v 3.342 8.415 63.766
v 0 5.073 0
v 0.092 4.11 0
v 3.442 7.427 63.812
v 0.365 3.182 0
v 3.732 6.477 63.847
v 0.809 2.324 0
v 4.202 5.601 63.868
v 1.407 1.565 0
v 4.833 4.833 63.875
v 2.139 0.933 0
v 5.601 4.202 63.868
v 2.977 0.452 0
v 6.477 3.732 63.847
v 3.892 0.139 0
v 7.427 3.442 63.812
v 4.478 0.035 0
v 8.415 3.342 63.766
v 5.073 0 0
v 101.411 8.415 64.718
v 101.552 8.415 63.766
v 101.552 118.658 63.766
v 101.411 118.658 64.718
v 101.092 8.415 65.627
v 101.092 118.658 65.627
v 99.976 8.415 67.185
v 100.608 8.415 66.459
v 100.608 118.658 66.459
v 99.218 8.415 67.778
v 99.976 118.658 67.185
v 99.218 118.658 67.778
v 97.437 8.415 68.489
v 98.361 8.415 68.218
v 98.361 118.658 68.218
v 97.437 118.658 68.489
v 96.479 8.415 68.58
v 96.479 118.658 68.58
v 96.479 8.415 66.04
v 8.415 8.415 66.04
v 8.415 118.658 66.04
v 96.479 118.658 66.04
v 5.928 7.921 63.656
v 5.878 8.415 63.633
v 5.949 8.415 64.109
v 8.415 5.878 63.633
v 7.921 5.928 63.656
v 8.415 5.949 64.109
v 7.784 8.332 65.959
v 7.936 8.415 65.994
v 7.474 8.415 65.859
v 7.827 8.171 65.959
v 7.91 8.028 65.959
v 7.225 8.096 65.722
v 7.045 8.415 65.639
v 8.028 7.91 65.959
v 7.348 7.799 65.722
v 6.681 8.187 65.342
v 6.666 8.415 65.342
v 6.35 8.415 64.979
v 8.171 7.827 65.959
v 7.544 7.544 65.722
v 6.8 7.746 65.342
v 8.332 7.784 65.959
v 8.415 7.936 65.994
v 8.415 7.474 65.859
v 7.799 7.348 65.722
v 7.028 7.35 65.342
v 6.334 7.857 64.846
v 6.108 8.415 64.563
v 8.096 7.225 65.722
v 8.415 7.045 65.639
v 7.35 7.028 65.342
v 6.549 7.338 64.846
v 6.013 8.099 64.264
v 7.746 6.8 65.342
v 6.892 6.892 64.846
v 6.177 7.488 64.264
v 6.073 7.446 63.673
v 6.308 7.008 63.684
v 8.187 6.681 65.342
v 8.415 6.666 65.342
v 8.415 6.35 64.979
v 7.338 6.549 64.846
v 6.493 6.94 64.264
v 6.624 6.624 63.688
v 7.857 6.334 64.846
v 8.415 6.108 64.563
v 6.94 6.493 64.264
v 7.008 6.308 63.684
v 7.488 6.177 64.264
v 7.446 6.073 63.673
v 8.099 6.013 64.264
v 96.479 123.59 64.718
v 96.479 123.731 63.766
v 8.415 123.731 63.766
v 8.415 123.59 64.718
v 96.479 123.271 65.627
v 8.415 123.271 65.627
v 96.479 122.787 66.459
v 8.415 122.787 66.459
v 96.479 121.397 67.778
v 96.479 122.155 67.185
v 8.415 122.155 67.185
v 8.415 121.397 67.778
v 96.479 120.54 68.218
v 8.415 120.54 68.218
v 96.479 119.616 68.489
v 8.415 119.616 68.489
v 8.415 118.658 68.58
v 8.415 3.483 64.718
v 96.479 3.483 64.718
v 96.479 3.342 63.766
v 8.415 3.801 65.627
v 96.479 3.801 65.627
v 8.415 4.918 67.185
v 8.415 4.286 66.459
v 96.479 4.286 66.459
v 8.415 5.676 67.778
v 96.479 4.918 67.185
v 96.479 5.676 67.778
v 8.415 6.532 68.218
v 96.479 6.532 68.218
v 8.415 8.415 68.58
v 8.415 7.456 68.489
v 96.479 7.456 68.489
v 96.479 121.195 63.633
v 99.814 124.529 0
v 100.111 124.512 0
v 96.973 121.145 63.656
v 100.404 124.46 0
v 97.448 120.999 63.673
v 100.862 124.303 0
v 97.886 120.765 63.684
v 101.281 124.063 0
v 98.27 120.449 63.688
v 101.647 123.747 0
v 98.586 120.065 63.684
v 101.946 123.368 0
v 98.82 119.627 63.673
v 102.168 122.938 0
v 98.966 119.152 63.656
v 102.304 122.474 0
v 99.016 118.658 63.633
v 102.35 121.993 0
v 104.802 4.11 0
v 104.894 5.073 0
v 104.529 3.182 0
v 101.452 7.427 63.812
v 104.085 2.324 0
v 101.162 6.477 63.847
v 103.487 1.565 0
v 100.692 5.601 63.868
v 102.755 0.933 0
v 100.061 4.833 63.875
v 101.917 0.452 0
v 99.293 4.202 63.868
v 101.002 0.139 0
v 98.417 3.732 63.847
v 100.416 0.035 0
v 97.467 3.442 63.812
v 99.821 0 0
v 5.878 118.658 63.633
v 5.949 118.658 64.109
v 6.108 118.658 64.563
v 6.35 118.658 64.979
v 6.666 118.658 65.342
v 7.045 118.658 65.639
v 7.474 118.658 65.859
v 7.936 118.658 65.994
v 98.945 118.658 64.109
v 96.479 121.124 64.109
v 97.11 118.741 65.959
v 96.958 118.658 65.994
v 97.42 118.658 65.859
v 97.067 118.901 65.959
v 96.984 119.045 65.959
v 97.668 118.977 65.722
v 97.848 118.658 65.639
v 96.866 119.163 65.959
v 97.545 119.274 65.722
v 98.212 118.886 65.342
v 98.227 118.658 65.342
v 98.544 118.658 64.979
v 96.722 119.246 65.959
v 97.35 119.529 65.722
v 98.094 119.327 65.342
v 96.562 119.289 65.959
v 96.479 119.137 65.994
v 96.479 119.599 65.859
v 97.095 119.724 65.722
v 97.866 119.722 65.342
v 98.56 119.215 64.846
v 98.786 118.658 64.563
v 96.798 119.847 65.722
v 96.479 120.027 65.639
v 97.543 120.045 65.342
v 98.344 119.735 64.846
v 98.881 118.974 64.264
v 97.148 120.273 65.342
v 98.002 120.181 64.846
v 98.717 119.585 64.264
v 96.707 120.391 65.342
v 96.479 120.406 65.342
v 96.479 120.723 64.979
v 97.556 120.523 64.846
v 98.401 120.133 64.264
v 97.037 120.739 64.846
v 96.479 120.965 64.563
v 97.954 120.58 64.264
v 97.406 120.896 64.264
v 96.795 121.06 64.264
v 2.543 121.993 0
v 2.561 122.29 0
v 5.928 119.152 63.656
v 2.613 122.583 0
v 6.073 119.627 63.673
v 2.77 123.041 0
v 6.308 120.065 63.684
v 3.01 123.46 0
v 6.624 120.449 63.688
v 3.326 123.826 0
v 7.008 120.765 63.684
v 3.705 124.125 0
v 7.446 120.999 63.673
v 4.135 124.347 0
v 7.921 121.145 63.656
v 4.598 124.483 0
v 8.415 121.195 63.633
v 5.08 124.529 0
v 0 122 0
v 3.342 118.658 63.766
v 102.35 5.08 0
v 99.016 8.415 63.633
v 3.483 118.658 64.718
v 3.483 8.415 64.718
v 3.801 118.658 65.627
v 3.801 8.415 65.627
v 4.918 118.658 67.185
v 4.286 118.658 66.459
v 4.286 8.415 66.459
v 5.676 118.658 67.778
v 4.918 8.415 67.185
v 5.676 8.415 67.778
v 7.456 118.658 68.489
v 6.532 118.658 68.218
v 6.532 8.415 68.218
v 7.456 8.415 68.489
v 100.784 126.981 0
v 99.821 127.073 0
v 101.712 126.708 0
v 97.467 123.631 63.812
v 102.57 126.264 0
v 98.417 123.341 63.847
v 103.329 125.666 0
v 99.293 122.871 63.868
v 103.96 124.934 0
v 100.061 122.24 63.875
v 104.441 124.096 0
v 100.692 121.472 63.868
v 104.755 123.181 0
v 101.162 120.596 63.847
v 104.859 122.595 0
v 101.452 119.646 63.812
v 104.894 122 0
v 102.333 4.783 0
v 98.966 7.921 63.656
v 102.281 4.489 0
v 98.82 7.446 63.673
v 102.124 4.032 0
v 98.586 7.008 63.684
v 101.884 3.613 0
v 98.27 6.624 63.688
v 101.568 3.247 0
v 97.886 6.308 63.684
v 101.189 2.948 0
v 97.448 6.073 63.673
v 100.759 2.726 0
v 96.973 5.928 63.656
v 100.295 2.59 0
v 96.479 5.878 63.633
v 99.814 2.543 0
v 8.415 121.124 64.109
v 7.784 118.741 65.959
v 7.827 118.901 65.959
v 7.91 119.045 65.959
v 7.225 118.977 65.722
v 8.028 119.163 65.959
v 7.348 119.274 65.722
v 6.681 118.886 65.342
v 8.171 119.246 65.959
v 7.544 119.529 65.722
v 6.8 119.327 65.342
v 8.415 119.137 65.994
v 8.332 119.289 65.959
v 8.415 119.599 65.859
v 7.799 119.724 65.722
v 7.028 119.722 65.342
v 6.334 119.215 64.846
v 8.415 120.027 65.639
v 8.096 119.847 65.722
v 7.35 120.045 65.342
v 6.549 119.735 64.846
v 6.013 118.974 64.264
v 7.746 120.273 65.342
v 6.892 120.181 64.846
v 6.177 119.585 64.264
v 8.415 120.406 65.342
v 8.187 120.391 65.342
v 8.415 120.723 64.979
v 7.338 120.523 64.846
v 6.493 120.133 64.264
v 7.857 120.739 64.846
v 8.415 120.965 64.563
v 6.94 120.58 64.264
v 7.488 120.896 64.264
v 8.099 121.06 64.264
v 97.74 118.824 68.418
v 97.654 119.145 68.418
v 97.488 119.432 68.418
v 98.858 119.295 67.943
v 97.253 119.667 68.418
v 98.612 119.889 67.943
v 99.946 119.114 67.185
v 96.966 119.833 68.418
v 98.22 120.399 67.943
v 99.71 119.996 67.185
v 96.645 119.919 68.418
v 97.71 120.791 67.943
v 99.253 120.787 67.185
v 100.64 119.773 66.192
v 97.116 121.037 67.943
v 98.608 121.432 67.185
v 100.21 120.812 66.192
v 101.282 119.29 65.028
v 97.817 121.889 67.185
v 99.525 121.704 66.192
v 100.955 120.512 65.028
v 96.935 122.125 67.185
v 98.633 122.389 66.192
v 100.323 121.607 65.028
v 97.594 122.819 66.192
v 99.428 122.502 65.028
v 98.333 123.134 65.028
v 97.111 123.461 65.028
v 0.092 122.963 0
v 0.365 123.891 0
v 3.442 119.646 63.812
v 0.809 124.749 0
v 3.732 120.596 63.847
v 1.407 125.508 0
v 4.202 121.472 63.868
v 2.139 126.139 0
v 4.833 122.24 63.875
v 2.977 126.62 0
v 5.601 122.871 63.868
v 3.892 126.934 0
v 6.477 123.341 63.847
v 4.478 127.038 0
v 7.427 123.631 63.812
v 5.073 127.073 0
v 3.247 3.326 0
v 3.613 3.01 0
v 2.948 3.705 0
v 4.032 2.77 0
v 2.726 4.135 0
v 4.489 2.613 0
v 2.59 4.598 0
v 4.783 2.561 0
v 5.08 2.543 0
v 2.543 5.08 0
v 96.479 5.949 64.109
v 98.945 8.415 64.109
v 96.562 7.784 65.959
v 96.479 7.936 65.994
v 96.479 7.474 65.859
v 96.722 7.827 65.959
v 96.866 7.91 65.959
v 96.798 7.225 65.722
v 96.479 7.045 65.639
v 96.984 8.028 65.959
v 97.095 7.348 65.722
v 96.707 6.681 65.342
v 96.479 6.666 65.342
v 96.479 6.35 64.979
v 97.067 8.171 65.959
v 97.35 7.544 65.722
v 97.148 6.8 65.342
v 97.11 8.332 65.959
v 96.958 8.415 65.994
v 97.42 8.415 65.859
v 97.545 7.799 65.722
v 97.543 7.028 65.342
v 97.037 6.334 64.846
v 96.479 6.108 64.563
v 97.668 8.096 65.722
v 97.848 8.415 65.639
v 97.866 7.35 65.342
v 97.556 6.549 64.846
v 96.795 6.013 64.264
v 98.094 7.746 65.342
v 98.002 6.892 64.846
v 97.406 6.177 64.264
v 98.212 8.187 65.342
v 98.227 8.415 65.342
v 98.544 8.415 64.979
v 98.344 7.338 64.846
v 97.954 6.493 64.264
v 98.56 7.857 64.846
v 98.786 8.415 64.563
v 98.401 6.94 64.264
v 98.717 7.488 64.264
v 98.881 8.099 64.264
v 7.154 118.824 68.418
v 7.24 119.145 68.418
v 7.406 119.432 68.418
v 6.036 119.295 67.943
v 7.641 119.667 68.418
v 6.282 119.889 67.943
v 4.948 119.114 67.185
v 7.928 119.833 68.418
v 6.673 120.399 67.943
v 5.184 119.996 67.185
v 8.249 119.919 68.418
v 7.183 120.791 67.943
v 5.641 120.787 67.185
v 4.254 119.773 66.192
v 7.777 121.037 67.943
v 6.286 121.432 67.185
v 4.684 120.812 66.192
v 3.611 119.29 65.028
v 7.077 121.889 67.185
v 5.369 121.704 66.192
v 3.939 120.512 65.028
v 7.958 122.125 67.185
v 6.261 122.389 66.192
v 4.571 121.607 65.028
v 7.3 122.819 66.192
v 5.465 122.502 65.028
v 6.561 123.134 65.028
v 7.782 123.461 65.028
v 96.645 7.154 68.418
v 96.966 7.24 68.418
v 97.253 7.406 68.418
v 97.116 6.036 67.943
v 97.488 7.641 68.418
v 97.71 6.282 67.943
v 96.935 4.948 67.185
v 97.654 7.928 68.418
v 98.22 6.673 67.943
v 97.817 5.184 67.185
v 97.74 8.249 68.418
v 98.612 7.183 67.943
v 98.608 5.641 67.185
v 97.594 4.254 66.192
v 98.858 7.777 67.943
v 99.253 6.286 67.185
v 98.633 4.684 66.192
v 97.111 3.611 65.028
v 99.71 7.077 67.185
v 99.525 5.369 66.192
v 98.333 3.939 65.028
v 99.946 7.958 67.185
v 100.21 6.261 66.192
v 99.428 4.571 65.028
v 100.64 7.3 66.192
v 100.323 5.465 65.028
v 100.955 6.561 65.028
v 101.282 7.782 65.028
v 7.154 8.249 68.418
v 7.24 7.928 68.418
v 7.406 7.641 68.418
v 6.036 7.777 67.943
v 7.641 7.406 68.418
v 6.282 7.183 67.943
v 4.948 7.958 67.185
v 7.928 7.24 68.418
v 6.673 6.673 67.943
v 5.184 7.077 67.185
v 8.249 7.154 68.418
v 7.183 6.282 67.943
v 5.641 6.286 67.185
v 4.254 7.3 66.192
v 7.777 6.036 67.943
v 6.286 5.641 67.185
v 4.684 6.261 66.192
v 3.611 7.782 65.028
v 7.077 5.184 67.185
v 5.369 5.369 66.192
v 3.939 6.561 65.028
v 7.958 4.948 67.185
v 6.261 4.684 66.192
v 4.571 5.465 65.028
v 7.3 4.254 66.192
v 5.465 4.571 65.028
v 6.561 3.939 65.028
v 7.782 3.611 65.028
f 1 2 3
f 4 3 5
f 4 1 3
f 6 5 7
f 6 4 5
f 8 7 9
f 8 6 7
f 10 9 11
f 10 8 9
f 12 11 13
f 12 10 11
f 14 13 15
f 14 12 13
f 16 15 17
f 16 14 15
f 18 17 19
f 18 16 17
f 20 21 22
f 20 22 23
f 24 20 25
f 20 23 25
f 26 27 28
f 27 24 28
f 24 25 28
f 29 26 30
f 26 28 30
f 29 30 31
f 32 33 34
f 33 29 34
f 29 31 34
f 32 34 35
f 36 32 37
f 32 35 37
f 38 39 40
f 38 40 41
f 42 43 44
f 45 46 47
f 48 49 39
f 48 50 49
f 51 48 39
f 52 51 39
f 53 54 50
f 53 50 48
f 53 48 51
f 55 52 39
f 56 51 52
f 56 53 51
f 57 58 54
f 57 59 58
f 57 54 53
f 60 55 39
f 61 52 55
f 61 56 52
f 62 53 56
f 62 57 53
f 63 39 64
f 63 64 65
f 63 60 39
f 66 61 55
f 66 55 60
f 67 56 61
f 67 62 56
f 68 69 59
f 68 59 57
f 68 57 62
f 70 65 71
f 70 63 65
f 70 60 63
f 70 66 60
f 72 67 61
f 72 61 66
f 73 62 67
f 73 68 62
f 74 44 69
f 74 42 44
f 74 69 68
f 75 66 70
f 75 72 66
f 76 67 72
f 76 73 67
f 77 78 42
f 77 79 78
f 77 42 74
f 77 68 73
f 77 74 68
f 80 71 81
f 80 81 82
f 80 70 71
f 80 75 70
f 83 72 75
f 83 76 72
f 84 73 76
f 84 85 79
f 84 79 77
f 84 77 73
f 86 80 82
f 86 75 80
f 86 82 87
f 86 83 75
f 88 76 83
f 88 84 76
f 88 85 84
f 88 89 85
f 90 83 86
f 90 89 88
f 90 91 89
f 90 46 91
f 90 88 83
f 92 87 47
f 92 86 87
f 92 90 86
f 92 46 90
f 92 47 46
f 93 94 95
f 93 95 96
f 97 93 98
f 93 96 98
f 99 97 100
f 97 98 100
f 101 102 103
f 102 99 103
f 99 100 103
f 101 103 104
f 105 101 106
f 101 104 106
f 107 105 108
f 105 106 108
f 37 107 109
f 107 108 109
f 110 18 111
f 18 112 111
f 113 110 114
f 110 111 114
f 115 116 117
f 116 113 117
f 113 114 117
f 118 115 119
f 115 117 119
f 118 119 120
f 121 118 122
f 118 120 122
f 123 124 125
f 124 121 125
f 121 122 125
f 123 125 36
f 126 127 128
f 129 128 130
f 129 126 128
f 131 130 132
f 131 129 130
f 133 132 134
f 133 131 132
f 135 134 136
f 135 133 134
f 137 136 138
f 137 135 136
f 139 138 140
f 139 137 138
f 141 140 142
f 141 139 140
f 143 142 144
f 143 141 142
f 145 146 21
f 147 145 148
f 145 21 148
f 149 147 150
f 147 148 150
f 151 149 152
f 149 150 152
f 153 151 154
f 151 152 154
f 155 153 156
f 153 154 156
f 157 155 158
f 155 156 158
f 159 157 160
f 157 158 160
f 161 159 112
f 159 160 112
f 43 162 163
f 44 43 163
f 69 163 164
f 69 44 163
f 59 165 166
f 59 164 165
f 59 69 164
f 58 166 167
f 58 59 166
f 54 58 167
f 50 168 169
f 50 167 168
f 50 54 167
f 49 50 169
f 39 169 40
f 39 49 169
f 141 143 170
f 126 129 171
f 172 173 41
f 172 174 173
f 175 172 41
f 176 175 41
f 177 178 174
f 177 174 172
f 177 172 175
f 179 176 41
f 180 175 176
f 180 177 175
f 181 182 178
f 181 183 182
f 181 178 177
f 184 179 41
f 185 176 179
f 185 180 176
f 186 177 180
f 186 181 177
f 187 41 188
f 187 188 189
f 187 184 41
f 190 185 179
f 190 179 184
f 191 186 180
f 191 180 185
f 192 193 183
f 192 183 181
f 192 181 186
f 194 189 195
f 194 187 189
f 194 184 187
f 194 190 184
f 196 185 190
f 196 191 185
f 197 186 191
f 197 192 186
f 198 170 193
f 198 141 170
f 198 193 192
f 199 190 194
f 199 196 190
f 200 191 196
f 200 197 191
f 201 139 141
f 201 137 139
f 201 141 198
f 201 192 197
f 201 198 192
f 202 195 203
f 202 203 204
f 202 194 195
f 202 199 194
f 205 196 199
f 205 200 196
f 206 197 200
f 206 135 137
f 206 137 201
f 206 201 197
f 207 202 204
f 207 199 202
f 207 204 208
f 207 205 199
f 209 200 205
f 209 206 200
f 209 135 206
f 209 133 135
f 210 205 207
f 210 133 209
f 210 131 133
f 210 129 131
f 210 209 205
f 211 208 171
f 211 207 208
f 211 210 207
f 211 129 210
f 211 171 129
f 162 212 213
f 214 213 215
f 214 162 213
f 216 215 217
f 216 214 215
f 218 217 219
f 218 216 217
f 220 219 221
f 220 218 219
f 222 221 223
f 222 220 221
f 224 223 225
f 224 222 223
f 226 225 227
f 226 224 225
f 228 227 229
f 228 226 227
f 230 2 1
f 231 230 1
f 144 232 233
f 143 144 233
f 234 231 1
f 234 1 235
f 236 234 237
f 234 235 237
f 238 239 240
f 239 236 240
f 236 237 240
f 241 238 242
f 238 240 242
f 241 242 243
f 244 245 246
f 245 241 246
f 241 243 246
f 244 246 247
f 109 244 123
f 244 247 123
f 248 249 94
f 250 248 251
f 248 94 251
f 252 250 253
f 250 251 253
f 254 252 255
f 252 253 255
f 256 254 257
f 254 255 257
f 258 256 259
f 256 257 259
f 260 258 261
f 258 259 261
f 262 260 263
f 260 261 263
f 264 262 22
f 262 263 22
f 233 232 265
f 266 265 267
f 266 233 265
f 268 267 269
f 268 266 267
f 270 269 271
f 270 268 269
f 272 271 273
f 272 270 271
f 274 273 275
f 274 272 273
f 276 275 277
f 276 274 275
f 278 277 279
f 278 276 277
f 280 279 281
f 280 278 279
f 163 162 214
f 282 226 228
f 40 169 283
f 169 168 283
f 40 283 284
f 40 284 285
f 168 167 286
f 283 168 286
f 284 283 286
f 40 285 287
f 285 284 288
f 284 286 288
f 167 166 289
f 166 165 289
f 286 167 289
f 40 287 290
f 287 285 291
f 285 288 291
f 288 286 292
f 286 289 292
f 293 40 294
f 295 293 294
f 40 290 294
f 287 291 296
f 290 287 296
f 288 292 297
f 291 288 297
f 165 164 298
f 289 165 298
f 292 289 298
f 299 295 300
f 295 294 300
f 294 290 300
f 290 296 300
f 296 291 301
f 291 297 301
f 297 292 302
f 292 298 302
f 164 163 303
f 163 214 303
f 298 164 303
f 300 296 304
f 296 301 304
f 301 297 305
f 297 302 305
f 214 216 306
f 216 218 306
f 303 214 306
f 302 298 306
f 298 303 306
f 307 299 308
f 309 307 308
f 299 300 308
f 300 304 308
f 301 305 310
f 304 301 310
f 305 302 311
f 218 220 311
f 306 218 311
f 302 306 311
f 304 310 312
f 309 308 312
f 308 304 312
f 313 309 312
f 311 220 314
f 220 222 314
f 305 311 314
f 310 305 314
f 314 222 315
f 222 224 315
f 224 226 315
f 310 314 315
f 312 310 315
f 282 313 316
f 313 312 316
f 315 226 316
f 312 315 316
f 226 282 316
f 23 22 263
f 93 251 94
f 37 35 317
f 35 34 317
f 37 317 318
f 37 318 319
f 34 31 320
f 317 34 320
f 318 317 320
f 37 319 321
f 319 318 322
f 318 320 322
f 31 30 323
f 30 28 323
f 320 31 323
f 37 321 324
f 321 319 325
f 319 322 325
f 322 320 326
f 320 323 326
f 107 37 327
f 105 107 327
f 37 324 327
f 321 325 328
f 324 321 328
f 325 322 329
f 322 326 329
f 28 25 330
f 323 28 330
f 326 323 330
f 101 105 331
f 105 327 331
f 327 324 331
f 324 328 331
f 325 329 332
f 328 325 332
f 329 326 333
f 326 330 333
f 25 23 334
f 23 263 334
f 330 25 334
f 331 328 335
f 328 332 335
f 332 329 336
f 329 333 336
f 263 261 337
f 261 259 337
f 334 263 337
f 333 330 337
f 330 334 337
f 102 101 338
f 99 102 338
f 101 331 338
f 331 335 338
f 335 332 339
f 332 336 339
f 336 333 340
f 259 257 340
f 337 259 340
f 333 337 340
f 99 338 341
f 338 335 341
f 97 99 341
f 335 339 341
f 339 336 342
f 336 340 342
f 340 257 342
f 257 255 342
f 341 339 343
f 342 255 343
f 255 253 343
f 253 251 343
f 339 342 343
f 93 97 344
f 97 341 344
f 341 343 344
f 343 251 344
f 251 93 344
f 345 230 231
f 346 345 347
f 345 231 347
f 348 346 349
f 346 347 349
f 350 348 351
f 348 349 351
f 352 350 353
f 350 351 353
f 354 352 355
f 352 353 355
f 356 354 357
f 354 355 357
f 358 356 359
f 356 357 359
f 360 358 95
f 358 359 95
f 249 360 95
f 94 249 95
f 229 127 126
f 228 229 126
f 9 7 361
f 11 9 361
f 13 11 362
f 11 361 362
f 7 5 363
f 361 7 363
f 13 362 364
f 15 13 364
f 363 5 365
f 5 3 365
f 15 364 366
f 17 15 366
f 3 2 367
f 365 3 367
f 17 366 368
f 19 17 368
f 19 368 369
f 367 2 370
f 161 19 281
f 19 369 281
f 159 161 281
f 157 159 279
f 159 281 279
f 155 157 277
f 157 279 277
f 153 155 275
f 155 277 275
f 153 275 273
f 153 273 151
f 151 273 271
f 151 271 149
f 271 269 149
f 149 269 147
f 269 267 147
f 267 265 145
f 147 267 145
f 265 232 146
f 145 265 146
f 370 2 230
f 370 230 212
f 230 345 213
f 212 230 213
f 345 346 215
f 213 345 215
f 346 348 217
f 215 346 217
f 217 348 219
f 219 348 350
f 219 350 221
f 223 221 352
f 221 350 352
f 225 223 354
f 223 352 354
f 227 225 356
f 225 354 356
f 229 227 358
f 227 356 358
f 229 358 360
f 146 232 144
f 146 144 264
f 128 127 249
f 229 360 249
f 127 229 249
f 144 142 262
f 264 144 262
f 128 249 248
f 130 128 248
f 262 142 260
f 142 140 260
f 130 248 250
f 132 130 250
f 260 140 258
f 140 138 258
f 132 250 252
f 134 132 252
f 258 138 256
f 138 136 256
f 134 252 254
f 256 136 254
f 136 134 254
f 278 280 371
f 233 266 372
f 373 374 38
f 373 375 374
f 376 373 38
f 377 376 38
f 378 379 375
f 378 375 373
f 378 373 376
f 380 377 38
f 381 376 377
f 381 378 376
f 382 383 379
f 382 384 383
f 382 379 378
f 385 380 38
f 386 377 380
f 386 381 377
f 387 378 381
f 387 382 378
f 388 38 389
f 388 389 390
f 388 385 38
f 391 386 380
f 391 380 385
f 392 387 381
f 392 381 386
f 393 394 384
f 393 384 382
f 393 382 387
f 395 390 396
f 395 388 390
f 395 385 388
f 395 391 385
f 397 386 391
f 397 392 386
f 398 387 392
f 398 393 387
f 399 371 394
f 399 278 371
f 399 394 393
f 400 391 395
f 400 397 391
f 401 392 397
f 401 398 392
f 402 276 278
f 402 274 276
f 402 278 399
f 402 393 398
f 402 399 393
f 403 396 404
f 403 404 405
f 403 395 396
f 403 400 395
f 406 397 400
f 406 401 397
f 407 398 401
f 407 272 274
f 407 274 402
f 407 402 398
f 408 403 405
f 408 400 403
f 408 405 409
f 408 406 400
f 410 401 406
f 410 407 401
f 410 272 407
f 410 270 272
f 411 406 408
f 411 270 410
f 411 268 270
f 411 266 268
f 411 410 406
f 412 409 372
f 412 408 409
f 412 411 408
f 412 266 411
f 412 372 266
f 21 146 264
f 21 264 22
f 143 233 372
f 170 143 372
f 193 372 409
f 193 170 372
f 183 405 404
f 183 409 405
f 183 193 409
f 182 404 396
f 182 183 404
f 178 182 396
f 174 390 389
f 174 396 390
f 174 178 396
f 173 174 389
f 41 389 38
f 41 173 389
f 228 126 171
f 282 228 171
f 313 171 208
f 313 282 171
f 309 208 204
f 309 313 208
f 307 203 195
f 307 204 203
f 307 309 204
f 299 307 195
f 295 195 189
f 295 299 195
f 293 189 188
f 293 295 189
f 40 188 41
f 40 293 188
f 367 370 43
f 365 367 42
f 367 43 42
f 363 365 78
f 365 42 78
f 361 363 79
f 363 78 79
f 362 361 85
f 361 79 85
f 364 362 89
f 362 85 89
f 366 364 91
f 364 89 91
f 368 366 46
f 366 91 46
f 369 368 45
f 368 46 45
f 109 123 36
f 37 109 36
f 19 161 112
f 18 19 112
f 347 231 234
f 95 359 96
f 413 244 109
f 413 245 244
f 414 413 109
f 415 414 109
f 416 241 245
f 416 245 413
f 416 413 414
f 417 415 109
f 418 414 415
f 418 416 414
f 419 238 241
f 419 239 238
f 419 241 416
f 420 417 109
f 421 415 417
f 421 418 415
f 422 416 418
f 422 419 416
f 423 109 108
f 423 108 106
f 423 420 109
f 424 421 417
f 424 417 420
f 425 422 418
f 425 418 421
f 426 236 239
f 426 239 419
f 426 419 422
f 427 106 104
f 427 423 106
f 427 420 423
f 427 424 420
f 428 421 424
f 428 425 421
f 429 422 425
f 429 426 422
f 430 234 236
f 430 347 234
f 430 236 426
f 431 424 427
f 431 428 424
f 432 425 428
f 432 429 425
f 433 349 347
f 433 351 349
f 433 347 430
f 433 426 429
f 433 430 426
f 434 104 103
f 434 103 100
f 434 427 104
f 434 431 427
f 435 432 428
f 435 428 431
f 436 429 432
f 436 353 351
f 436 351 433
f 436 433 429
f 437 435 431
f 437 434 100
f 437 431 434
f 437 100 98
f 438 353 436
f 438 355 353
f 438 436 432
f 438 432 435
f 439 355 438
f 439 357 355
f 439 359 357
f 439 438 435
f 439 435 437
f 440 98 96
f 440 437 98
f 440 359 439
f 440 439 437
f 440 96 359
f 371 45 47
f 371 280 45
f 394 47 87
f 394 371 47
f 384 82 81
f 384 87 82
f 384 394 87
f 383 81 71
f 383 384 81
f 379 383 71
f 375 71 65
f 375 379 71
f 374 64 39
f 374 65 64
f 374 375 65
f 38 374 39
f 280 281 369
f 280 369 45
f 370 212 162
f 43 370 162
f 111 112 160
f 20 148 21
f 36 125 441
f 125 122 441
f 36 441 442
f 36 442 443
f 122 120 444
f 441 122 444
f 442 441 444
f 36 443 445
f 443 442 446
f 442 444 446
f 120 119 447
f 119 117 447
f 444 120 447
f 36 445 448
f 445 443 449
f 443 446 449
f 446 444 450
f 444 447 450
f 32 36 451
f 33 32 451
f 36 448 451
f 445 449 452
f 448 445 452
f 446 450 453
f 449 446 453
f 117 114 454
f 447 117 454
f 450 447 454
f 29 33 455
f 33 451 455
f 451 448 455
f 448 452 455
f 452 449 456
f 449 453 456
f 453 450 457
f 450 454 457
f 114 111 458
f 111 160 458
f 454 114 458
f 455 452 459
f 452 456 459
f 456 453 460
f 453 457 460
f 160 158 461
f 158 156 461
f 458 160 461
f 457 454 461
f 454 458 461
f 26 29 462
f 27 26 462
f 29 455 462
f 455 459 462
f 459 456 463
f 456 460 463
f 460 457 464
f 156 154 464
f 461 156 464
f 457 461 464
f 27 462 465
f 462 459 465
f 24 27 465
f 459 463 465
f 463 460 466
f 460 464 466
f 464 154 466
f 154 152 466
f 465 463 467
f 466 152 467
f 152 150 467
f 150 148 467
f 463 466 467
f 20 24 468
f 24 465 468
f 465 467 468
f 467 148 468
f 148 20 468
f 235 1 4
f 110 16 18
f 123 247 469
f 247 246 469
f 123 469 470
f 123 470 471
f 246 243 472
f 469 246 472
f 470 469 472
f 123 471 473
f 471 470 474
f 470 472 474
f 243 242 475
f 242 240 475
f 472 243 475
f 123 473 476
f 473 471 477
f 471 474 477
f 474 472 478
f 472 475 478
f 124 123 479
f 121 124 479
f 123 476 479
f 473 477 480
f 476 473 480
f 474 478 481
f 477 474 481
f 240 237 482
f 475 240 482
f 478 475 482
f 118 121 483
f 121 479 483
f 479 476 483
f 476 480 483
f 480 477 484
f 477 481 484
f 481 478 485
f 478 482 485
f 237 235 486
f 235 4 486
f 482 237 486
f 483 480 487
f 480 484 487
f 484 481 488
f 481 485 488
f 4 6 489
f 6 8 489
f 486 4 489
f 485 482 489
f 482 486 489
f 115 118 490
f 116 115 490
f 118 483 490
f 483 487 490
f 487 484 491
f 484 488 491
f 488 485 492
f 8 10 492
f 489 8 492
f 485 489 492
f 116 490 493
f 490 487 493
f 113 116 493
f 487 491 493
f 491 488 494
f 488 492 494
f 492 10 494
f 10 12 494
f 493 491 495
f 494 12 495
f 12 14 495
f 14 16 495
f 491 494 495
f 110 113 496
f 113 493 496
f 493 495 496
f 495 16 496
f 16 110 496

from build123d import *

# Parameters (mm, degrees)
F0_W     = 104.8938632011
F0_H     = 127.0728558302
F1_DEPTH = 68.58
F1_TAPER = 3
F2_R     = 5.08
F3_T     = -2.54


with BuildPart() as f1:
    # F0 (on Top) → F1 (new body)
    with BuildSketch(Plane.XY):
        with Locations((52.4469316006, 63.5364279151)):
            Rectangle(F0_W, F0_H)
    extrude(amount=F1_DEPTH, taper=F1_TAPER)

    # F2
    f2_edges = [f1.edges().sort_by_distance(p)[0] for p in [
        (103.0968, 1.797063, 34.29),
        (103.0968, 125.275793, 34.29),
        (1.797063, 125.275793, 34.29),
        (1.797063, 1.797063, 34.29),
        (3.594126, 63.536428, 68.58),
        (52.446932, 3.594126, 68.58),
        (101.299738, 63.536428, 68.58),
        (52.446932, 123.47873, 68.58),
    ]]
    fillet(f2_edges, radius=F2_R)

    # F3
    f3_openings = [f1.faces().sort_by_distance(p)[0] for p in [
        (52.446932, 63.536428, 0),
    ]]
    offset(amount=F3_T, openings=f3_openings)


solid = f1.part
